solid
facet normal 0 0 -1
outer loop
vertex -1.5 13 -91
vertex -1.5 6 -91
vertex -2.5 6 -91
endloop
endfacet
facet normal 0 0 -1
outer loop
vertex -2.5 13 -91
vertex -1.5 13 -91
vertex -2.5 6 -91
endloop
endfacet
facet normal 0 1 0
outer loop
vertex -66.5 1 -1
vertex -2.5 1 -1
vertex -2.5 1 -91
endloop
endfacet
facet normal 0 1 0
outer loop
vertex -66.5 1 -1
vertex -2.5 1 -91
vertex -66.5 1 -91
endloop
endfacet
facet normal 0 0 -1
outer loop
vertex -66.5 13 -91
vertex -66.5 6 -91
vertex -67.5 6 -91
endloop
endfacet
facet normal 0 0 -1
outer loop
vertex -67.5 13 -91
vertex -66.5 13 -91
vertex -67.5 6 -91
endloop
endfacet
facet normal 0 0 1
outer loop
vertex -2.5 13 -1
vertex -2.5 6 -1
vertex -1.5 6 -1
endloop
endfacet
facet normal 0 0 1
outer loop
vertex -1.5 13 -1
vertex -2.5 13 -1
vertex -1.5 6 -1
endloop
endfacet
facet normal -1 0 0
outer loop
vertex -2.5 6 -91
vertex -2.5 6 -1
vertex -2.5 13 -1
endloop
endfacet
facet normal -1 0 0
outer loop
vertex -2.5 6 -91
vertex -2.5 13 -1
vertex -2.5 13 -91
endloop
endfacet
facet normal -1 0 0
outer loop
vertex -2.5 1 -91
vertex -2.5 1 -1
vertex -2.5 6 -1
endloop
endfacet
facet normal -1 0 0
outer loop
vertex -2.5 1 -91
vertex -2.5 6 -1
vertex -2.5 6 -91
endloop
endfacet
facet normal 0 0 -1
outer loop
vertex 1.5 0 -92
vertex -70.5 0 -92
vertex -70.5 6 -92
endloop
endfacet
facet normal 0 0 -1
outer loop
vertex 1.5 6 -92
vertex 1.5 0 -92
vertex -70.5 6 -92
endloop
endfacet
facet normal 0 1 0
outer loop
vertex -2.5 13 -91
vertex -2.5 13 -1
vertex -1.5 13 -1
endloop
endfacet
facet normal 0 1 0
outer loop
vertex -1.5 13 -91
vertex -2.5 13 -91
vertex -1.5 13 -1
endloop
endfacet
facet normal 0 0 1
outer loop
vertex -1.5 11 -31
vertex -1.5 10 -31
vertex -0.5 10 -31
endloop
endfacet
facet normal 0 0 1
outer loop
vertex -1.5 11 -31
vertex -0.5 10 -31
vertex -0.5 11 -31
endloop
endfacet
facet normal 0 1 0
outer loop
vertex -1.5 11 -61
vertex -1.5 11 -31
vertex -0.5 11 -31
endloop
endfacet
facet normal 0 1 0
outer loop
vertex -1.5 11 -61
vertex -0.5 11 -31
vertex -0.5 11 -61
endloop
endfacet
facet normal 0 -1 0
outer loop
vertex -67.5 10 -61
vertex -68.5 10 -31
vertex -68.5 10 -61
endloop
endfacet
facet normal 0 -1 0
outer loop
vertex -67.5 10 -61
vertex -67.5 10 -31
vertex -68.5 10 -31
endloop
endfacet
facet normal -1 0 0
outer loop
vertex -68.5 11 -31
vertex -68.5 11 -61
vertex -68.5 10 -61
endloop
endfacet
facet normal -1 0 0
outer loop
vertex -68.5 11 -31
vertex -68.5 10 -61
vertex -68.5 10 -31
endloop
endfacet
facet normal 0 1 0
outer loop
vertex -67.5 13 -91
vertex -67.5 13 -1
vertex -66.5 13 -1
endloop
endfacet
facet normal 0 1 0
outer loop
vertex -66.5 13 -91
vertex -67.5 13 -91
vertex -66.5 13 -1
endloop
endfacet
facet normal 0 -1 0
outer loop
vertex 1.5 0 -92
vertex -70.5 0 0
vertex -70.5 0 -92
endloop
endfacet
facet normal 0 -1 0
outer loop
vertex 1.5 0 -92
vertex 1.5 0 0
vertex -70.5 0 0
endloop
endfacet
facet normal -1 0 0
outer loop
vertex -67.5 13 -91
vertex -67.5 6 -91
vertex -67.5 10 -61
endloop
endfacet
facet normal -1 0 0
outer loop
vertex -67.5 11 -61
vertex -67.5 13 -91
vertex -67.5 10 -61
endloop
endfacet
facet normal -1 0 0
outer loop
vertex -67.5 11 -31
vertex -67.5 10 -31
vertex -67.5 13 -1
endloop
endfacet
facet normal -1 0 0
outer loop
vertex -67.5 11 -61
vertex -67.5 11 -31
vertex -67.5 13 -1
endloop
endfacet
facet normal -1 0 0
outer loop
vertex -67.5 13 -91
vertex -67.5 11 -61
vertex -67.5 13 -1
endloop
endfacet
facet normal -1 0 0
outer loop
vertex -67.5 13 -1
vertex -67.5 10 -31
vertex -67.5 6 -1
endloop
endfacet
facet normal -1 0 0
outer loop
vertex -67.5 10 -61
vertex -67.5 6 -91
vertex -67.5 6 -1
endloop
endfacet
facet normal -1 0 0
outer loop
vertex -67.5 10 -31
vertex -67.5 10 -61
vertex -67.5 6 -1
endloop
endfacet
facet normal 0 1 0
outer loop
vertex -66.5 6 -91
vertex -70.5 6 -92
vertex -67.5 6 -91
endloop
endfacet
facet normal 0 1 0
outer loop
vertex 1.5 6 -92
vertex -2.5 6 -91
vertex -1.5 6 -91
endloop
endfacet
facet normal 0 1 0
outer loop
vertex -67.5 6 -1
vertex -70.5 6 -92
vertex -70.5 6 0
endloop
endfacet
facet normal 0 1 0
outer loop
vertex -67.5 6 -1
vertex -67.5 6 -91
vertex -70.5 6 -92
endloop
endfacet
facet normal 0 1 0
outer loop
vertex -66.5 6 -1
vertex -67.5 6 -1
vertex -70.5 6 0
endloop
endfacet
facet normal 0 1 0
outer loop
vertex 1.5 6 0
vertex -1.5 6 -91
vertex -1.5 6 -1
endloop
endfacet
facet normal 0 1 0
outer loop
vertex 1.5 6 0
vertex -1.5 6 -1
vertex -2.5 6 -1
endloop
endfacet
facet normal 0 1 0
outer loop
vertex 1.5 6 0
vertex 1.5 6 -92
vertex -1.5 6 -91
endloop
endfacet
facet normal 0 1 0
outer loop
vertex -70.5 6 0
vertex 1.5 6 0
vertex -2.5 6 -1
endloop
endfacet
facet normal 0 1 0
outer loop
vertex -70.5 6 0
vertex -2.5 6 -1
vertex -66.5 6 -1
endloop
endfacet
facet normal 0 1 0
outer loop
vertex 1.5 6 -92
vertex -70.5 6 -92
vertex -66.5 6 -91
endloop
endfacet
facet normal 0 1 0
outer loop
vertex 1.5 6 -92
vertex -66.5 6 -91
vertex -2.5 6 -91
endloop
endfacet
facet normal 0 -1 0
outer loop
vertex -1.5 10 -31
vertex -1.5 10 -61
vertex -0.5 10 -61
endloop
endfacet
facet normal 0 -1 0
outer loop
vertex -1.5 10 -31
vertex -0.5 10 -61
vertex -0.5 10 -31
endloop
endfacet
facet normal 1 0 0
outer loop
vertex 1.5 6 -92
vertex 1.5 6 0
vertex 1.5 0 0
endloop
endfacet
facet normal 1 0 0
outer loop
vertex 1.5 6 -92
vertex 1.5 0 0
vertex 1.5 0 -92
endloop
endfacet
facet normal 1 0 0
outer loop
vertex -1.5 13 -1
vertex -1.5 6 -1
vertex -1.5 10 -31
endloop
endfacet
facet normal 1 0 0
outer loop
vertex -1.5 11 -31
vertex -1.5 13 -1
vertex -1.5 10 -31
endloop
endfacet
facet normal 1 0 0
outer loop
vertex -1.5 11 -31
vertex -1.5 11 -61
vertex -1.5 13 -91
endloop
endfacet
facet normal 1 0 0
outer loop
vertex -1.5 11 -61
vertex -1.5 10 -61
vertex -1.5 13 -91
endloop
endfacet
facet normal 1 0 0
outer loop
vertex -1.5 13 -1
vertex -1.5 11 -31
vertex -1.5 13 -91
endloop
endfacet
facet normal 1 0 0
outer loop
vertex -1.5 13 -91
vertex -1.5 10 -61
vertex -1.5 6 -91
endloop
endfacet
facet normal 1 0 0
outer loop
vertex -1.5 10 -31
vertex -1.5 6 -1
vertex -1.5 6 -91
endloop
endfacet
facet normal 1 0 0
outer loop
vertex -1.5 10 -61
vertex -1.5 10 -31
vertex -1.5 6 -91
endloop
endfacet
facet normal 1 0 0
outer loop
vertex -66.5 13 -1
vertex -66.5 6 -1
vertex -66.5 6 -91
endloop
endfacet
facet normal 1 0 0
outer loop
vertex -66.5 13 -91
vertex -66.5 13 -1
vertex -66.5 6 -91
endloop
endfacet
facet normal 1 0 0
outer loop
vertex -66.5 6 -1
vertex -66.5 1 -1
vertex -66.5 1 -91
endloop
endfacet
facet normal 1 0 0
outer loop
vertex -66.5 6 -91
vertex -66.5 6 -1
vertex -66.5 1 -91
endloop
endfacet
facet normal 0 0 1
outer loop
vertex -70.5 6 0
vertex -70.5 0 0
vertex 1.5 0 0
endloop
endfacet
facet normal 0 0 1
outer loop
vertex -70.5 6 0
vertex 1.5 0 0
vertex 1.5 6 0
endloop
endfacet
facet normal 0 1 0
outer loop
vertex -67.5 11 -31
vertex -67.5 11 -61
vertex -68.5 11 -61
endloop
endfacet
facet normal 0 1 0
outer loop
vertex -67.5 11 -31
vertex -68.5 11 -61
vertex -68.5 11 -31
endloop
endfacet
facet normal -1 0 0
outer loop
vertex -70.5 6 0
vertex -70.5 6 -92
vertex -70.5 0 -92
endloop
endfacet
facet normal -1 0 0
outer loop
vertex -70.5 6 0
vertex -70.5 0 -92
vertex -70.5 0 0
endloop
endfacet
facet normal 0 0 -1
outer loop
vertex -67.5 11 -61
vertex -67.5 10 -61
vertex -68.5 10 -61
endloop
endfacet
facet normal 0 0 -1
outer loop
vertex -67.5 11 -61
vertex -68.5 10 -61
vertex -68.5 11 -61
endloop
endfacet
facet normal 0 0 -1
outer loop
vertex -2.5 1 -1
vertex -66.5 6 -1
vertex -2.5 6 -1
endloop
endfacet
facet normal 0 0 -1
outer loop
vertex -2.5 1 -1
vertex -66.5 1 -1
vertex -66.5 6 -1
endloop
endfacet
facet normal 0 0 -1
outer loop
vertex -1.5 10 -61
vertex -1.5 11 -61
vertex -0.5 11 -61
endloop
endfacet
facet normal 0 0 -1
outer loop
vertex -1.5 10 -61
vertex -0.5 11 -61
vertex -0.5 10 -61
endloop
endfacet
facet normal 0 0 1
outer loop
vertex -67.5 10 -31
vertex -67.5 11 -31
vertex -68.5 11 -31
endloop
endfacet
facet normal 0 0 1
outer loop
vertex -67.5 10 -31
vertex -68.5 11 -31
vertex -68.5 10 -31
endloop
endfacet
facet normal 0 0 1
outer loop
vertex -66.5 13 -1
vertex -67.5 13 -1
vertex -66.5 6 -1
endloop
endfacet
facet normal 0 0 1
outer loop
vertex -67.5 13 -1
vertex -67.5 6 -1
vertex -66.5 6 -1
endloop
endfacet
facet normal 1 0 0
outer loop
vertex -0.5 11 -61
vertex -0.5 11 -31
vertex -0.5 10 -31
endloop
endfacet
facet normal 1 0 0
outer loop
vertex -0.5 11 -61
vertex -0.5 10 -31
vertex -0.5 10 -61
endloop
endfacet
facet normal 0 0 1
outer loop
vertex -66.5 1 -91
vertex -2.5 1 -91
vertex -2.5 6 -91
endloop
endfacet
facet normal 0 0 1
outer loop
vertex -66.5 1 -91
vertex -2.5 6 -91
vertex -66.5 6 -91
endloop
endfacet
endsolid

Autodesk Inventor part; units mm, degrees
ref_plane "YZ Plane" through (0, 0, 0) normal (1, 0, 0) x (0, 1, 0)
ref_plane "XZ Plane" through (0, 0, 0) normal (0, 1, 0) x (-1, 0, 0)
ref_plane "XY Plane" through (0, 0, 0) normal (0, 0, 1) x (1, 0, 0)
sketch "Sketch1" plane through (0, 0, 0) normal (0, 1, 0) x (-1, 0, 0)
  line L0 (0, 0) -> (69, 0)
  line L1 (69, 0) -> (69, -92)
  line L2 (69, -92) -> (0, -92)
  line L3 (0, -92) -> (0, 0)
  dimension "d0" = 69
  dimension "d1" = 92
extrude "Extrusion1" add sketch "Sketch1" along normal blind 1
sketch "Sketch2" plane through (0, 1, 0) normal (0, 1, 0) x (1, 0, 0)
  line L0 (-69, 0) -> (0, 0) projected
  line L1 (0, 0) -> (0, 92) projected
  line L2 (0, 92) -> (-69, 92) projected
  line L3 (-69, 92) -> (-69, 0) projected
  line L4 (-68, 1) -> (-1, 1)
  line L5 (-1, 1) -> (-1, 91)
  line L6 (-1, 91) -> (-68, 91)
  line L7 (-68, 91) -> (-68, 1)
  line L8 (-67.5, 1) -> (-67.5, 91)
  line L9 (-1.5, 1) -> (-1.5, 91)
  dimension "d4" = 1
  dimension "d5" = 0.5
  dimension "d6" = 0.5
extrude "Extrusion2" add sketch "Sketch2" along normal blind 5 contours L3 L2 L1 L0 | L7 L6 L8 L4 | L9 L6 L5 L4
sketch "Sketch3" plane through (0, 1, 0) normal (0, 1, 0) x (1, 0, 0)
  line L0 (-67.5, 91) -> (-67.5, 1) projected
  line L1 (-67.5, 1) -> (-1.5, 1) projected
  line L2 (-1.5, 1) -> (-1.5, 91) projected
  line L3 (-1.5, 91) -> (-67.5, 91) projected
  line L4 (-67.5, 1) -> (-1.5, 1) projected
  line L5 (-66.5, 1) -> (-66.5, 91)
  line L6 (-2.5, 1) -> (-2.5, 91)
  point P0 (0, 0)
  dimension "d9" = 1
  dimension "d10" = 1
extrude "Extrusion3" add sketch "Sketch3" along normal blind 12 contours L3 L5 L1 L0 | L3 L2 L1 L6
sketch "Sketch4" plane through (-1.5, 6, -91) normal (1, 0, 0) x (0, 0, -1)
  line L0 (-90, 0) -> (-90, 7) projected
  line L1 (-90, 4) -> (-90, 5)
  line L2 (0, 0) -> (0, 7) projected
  line L3 (-90, 7) -> (0, 7) projected
  line L4 (-60, 5) -> (-30, 5)
  line L5 (-30, 5) -> (-30, 4)
  line L6 (-30, 4) -> (-60, 4)
  line L7 (-60, 4) -> (-60, 5)
  line L8 (0, 0) -> (-90, 0) projected
  point P0 (-91, -6)
  dimension "d21" = 1
  dimension "d22" = 2
  dimension "d23" = 4
  dimension "d24" = 30
  dimension "d25" = 30
ref_plane "Work Plane1" through (-34.5, 0, 0) normal (1, 0, 0) x (0, 0, -1)
extrude "Extrusion5" add sketch "Sketch4" along normal blind 1 contours L4 L5 L6 L7
mirror "Mirror2" about plane through (-34.5, 0, 0) normal (1, 0, 0) of "Extrusion5"
sketch "Sketch5" plane through (0, 0, 0) normal (1, 0, 0) x (0, 0, -1)
  line L0 (92, 0) -> (0, 0) projected
  line L1 (92, 0) -> (92, 6) projected
  line L2 (0, 6) -> (92, 6) projected
  line L3 (0, 0) -> (0, 6) projected
extrude "Extrusion6" add sketch "Sketch5" along normal blind 1.5
sketch "Sketch6" plane through (-69, 0, -92) normal (-1, 0, 0) x (0, 0, 1)
  line L0 (92, 0) -> (0, 0) projected
  line L1 (92, 0) -> (92, 6) projected
  line L2 (0, 6) -> (92, 6) projected
  line L3 (0, 0) -> (0, 6) projected
extrude "Extrusion7" add sketch "Sketch6" along normal blind 1.5
properties part number "top2"
